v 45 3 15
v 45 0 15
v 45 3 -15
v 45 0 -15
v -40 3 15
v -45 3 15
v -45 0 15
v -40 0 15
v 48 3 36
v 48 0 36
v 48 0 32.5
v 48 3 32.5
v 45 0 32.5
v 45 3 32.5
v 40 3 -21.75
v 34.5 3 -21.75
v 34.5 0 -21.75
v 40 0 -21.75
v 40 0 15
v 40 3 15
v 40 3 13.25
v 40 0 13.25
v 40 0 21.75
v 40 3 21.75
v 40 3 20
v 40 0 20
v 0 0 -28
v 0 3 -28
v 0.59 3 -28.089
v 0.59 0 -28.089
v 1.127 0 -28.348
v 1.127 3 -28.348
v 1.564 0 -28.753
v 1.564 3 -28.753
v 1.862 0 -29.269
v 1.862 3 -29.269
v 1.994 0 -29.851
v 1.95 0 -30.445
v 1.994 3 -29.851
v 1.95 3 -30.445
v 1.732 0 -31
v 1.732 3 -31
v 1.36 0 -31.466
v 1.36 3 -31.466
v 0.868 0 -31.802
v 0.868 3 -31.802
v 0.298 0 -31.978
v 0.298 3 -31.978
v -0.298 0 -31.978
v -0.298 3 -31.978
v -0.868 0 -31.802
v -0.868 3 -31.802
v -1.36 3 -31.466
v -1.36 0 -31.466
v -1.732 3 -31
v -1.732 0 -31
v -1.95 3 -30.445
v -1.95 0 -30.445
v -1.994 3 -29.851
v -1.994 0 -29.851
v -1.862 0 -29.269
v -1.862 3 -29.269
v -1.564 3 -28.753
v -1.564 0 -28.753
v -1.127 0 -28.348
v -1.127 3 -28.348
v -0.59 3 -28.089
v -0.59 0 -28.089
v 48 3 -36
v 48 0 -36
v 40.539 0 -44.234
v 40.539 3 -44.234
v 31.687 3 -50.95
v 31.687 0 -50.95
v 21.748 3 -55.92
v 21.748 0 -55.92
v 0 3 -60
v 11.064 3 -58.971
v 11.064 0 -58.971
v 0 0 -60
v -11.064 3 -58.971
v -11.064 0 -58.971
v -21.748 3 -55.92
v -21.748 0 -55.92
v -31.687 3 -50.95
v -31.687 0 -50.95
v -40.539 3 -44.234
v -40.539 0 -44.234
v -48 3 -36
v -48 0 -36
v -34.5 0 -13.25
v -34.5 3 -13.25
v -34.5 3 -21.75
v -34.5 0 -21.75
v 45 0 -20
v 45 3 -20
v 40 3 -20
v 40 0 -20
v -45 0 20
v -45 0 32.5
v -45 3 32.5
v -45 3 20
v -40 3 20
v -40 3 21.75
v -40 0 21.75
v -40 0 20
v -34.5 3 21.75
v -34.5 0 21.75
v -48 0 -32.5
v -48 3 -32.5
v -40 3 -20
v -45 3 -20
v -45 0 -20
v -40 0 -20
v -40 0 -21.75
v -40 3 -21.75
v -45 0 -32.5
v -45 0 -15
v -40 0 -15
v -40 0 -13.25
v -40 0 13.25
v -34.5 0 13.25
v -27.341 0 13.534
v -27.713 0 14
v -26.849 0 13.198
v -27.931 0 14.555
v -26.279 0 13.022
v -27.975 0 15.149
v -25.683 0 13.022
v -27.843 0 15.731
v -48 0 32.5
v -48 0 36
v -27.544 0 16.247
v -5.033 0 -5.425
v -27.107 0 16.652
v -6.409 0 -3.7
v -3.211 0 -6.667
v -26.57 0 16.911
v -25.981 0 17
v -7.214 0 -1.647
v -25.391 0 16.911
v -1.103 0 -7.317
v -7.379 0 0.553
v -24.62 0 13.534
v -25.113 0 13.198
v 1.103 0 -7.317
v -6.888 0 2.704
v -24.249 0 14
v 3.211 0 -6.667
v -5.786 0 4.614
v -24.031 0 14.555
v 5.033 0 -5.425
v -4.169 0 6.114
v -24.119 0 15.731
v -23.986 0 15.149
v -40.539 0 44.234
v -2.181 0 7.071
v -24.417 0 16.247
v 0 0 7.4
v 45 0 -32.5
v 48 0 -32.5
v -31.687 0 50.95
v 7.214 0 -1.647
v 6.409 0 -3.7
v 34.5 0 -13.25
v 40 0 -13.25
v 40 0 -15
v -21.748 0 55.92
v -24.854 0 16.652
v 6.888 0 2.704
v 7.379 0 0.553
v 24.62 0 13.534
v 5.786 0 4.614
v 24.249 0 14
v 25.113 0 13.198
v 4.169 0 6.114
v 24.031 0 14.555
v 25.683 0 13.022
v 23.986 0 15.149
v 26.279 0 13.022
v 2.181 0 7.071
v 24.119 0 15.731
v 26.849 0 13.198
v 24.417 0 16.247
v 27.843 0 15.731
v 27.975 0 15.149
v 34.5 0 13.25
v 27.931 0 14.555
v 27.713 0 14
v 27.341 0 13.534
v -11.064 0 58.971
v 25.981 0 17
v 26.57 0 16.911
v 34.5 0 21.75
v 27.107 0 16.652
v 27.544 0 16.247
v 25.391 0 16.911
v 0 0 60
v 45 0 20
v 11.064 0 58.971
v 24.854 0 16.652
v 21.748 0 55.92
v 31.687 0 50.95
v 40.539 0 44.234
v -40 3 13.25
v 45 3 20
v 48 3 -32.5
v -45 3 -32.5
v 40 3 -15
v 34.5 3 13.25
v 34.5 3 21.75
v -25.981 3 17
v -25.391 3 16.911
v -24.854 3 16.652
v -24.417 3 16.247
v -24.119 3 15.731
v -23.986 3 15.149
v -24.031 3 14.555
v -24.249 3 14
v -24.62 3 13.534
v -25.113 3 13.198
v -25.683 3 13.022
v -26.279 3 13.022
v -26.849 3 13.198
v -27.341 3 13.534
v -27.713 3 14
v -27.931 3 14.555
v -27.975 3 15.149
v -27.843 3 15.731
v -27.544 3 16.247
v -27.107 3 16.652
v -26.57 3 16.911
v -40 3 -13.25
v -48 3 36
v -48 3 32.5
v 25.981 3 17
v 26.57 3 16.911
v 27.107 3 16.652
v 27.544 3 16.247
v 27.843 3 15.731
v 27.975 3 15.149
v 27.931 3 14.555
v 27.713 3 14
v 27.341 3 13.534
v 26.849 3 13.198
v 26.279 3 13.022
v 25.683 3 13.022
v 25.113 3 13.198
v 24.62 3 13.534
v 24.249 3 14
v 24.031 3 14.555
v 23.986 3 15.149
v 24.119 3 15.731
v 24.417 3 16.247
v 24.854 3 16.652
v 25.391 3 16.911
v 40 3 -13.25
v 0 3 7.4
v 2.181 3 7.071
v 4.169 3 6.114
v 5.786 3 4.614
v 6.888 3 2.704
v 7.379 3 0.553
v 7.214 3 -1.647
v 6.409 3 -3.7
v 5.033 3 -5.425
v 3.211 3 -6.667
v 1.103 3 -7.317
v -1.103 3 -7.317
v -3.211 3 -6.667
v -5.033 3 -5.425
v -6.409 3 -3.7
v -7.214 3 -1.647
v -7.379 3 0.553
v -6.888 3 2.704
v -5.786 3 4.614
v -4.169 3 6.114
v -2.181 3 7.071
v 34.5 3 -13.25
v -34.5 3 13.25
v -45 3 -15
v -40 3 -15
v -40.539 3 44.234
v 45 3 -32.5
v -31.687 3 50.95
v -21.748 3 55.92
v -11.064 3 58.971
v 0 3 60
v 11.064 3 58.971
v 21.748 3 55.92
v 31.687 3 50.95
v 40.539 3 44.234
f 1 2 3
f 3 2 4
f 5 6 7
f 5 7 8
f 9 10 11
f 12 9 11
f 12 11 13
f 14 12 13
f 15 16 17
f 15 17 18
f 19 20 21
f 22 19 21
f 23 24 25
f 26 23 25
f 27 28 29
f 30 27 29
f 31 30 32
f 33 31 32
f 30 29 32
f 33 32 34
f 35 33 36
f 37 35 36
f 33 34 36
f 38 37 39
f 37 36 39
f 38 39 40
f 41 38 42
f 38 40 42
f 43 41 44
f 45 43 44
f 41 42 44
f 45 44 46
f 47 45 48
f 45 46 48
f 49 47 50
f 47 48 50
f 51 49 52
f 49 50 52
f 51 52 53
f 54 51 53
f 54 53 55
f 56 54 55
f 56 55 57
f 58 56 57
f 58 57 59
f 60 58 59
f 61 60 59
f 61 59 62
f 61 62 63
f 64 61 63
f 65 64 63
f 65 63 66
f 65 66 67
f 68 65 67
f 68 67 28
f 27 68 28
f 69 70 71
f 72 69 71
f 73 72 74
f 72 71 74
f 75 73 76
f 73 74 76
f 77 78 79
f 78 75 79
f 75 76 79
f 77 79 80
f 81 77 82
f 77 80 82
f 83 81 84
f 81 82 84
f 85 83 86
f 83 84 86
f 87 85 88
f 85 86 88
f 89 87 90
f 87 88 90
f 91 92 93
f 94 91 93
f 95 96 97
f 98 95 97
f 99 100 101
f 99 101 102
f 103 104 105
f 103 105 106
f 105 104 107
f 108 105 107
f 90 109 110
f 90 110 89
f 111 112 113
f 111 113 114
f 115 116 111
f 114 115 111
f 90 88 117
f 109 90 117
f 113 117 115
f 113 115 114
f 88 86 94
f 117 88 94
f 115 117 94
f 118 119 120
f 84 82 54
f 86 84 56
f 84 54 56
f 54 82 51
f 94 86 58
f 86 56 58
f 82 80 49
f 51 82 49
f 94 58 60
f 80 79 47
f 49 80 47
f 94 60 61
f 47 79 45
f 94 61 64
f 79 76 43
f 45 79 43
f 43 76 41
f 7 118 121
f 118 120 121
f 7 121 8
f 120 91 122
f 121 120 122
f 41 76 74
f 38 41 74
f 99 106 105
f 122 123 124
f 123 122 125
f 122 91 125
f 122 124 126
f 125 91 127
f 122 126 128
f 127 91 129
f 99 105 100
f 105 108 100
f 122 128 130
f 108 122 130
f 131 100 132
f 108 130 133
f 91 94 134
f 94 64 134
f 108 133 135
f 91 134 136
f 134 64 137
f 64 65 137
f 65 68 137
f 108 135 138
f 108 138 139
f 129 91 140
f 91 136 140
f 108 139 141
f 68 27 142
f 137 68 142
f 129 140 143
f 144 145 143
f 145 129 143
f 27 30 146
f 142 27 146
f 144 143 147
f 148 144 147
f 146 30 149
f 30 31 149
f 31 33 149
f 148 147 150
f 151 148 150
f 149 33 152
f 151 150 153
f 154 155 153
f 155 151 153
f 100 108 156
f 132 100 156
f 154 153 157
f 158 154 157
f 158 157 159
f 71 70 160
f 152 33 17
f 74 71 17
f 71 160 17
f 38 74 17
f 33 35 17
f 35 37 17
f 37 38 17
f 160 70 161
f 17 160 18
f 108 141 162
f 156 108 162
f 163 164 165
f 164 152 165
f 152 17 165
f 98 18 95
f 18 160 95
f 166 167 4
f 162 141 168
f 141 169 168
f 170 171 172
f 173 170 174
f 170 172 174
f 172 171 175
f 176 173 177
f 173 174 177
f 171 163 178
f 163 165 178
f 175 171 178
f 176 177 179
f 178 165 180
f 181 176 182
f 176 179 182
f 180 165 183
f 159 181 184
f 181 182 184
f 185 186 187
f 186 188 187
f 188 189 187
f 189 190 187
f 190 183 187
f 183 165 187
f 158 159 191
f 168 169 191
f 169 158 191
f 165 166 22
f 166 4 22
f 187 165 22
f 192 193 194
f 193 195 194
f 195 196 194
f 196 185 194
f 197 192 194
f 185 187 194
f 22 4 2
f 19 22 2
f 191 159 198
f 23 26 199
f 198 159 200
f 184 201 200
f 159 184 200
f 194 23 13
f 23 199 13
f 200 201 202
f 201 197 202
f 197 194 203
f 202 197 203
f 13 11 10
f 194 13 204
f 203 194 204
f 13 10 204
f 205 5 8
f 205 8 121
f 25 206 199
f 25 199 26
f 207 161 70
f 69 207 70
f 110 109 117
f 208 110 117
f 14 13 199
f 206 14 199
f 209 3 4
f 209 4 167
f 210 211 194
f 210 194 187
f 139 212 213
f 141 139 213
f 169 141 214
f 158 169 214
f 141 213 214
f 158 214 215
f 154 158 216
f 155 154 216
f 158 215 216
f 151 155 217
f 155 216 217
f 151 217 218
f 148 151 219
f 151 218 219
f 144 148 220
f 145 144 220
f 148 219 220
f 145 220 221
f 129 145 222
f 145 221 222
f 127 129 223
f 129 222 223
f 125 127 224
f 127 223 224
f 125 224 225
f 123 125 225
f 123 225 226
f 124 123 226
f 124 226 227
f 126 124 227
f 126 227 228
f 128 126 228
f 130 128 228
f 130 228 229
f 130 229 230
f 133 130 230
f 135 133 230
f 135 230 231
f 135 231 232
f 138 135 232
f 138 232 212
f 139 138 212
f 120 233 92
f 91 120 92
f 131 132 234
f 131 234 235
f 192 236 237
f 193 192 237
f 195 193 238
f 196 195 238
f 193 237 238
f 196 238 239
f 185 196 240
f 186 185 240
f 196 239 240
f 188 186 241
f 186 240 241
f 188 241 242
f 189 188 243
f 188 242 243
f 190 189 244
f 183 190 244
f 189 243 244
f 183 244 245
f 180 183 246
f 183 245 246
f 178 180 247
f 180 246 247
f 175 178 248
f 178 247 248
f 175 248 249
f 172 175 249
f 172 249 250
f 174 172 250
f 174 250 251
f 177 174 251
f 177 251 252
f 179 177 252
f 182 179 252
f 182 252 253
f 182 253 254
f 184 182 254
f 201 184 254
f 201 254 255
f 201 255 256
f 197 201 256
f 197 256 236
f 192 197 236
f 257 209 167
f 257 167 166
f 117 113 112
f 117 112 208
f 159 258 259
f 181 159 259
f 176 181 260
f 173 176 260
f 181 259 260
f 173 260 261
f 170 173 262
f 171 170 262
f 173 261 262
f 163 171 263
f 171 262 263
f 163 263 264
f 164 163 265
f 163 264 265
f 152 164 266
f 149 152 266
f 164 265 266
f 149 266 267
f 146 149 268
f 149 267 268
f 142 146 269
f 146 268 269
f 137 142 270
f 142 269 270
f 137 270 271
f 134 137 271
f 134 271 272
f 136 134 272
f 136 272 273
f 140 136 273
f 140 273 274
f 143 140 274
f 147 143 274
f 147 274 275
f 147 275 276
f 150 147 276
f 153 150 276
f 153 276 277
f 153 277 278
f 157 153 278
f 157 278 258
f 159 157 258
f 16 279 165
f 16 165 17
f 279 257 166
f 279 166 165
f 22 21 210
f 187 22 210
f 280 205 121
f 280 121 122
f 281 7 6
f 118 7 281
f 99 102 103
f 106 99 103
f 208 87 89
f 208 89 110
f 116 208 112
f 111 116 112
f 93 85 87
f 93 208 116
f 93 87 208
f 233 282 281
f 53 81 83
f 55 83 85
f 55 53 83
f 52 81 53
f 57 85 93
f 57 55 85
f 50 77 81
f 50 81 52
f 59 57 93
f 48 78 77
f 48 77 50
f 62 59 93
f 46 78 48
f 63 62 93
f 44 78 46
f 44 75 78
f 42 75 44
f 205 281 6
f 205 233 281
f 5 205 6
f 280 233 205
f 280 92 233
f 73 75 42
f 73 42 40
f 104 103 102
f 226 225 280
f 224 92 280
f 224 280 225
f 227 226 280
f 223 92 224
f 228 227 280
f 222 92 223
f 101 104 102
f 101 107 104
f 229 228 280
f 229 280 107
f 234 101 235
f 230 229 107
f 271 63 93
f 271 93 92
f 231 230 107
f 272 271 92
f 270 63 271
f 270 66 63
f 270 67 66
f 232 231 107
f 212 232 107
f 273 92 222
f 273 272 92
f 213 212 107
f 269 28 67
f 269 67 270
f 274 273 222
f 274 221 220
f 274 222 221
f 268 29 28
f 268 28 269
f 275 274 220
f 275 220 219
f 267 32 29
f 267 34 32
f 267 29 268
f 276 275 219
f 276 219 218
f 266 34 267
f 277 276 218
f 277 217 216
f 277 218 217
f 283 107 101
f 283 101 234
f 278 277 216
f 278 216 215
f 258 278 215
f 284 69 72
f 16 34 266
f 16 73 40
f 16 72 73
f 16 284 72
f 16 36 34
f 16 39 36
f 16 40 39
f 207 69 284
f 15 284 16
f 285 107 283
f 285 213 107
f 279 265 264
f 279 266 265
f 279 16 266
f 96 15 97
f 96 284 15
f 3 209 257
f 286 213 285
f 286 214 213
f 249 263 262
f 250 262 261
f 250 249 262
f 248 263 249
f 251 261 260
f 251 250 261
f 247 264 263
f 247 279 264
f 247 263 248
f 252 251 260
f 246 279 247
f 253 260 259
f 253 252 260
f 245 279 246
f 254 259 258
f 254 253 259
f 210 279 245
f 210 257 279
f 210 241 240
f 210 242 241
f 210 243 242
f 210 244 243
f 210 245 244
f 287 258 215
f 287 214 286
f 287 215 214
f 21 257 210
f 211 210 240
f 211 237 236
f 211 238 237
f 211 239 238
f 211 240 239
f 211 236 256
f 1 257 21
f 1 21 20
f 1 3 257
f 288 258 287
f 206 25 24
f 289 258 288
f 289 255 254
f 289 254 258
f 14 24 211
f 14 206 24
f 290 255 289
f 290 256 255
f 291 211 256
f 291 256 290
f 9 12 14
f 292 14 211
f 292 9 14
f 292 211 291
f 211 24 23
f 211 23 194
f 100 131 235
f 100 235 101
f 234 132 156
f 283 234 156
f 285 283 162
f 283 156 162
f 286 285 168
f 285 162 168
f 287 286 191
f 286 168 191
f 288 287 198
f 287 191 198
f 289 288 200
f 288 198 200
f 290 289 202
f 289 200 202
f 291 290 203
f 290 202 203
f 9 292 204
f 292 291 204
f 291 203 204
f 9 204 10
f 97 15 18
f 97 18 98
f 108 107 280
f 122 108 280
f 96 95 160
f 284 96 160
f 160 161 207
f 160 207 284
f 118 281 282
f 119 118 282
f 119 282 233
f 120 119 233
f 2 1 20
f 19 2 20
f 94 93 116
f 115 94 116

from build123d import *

# Parameters (mm, degrees)
SKETCH1_R           = 60
BOSS_EXTRUDE1_DEPTH = 3
SKETCH2_R           = 7.4
CUT_EXTRUDE3_DEPTH  = 85.905830189
CUT_EXTRUDE1_START  = -3
CUT_EXTRUDE1_DEPTH  = 3
CUT_EXTRUDE2_DEPTH  = 3
SKETCH6_R           = 2
CUT_EXTRUDE4_DEPTH  = 77.896033708


with BuildPart() as part:
    # Sketch1 → Boss-Extrude1 (new body)
    with BuildSketch(Plane(origin=(0, 0, 0), x_dir=(1, 0, 0), z_dir=(0, 1, 0))):
        Circle(SKETCH1_R)
    extrude(amount=BOSS_EXTRUDE1_DEPTH)

    # Sketch2 → Cut-Extrude3 (cut, through all)
    with BuildSketch(Plane(origin=(0, 3, 0), x_dir=(1, 0, 0), z_dir=(0, 1, 0))):
        Circle(SKETCH2_R)
    extrude(amount=-CUT_EXTRUDE3_DEPTH, mode=Mode.SUBTRACT)

    # Sketch3 → Cut-Extrude1 (cut)
    with BuildSketch(Plane(origin=(0, 3, 0), x_dir=(1, 0, 0), z_dir=(0, 1, 0)).offset(CUT_EXTRUDE1_START)):
        with BuildLine():
            Line((-48, 32.5), (-48, 36))
            ThreePointArc((-48, 36), (-60, 0), (-48, -36))
            Line((-48, -36), (-48, -32.5))
            Line((-48, -32.5), (-45, -32.5))
            Line((-45, -32.5), (-45, 32.5))
            Line((-45, 32.5), (-48, 32.5))
        make_face()
    cut_extrude1 = extrude(amount=CUT_EXTRUDE1_DEPTH, mode=Mode.SUBTRACT)

    # Sketch4 → Cut-Extrude2 (cut)
    with BuildSketch(Plane(origin=(0, 3, 0), x_dir=(1, 0, 0), z_dir=(0, 1, 0))):
        Polygon((-40, -15), (-45, -15), (-45, -20), (-40, -20), (-40, -21.75), (-34.5, -21.75), (-34.5, -13.25), (-40, -13.25), align=None)
        Polygon((-40, 20), (-45, 20), (-45, 15), (-40, 15), (-40, 13.25), (-34.5, 13.25), (-34.5, 21.75), (-40, 21.75), align=None)
    cut_extrude2 = extrude(amount=-CUT_EXTRUDE2_DEPTH, mode=Mode.SUBTRACT)

    # Mirror1: Cut-Extrude1, Cut-Extrude2 across plane
    add(cut_extrude1.mirror(Plane(origin=(0, 0, 0), x_dir=(0, 0, 1), z_dir=(1, 0, 0))), mode=Mode.SUBTRACT)
    add(cut_extrude2.mirror(Plane(origin=(0, 0, 0), x_dir=(0, 0, 1), z_dir=(1, 0, 0))), mode=Mode.SUBTRACT)

    # Sketch6 → Cut-Extrude4 (cut, through all)
    with BuildSketch(Plane(origin=(0, 3, 0), x_dir=(1, 0, 0), z_dir=(0, 1, 0))):
        with Locations((25.980762114, -15)):
            Circle(SKETCH6_R)
        with Locations((-25.980762114, -15)):
            Circle(SKETCH6_R)
        with Locations((0, 30)):
            Circle(SKETCH6_R)
    extrude(amount=-CUT_EXTRUDE4_DEPTH, mode=Mode.SUBTRACT)


solid = part.part
